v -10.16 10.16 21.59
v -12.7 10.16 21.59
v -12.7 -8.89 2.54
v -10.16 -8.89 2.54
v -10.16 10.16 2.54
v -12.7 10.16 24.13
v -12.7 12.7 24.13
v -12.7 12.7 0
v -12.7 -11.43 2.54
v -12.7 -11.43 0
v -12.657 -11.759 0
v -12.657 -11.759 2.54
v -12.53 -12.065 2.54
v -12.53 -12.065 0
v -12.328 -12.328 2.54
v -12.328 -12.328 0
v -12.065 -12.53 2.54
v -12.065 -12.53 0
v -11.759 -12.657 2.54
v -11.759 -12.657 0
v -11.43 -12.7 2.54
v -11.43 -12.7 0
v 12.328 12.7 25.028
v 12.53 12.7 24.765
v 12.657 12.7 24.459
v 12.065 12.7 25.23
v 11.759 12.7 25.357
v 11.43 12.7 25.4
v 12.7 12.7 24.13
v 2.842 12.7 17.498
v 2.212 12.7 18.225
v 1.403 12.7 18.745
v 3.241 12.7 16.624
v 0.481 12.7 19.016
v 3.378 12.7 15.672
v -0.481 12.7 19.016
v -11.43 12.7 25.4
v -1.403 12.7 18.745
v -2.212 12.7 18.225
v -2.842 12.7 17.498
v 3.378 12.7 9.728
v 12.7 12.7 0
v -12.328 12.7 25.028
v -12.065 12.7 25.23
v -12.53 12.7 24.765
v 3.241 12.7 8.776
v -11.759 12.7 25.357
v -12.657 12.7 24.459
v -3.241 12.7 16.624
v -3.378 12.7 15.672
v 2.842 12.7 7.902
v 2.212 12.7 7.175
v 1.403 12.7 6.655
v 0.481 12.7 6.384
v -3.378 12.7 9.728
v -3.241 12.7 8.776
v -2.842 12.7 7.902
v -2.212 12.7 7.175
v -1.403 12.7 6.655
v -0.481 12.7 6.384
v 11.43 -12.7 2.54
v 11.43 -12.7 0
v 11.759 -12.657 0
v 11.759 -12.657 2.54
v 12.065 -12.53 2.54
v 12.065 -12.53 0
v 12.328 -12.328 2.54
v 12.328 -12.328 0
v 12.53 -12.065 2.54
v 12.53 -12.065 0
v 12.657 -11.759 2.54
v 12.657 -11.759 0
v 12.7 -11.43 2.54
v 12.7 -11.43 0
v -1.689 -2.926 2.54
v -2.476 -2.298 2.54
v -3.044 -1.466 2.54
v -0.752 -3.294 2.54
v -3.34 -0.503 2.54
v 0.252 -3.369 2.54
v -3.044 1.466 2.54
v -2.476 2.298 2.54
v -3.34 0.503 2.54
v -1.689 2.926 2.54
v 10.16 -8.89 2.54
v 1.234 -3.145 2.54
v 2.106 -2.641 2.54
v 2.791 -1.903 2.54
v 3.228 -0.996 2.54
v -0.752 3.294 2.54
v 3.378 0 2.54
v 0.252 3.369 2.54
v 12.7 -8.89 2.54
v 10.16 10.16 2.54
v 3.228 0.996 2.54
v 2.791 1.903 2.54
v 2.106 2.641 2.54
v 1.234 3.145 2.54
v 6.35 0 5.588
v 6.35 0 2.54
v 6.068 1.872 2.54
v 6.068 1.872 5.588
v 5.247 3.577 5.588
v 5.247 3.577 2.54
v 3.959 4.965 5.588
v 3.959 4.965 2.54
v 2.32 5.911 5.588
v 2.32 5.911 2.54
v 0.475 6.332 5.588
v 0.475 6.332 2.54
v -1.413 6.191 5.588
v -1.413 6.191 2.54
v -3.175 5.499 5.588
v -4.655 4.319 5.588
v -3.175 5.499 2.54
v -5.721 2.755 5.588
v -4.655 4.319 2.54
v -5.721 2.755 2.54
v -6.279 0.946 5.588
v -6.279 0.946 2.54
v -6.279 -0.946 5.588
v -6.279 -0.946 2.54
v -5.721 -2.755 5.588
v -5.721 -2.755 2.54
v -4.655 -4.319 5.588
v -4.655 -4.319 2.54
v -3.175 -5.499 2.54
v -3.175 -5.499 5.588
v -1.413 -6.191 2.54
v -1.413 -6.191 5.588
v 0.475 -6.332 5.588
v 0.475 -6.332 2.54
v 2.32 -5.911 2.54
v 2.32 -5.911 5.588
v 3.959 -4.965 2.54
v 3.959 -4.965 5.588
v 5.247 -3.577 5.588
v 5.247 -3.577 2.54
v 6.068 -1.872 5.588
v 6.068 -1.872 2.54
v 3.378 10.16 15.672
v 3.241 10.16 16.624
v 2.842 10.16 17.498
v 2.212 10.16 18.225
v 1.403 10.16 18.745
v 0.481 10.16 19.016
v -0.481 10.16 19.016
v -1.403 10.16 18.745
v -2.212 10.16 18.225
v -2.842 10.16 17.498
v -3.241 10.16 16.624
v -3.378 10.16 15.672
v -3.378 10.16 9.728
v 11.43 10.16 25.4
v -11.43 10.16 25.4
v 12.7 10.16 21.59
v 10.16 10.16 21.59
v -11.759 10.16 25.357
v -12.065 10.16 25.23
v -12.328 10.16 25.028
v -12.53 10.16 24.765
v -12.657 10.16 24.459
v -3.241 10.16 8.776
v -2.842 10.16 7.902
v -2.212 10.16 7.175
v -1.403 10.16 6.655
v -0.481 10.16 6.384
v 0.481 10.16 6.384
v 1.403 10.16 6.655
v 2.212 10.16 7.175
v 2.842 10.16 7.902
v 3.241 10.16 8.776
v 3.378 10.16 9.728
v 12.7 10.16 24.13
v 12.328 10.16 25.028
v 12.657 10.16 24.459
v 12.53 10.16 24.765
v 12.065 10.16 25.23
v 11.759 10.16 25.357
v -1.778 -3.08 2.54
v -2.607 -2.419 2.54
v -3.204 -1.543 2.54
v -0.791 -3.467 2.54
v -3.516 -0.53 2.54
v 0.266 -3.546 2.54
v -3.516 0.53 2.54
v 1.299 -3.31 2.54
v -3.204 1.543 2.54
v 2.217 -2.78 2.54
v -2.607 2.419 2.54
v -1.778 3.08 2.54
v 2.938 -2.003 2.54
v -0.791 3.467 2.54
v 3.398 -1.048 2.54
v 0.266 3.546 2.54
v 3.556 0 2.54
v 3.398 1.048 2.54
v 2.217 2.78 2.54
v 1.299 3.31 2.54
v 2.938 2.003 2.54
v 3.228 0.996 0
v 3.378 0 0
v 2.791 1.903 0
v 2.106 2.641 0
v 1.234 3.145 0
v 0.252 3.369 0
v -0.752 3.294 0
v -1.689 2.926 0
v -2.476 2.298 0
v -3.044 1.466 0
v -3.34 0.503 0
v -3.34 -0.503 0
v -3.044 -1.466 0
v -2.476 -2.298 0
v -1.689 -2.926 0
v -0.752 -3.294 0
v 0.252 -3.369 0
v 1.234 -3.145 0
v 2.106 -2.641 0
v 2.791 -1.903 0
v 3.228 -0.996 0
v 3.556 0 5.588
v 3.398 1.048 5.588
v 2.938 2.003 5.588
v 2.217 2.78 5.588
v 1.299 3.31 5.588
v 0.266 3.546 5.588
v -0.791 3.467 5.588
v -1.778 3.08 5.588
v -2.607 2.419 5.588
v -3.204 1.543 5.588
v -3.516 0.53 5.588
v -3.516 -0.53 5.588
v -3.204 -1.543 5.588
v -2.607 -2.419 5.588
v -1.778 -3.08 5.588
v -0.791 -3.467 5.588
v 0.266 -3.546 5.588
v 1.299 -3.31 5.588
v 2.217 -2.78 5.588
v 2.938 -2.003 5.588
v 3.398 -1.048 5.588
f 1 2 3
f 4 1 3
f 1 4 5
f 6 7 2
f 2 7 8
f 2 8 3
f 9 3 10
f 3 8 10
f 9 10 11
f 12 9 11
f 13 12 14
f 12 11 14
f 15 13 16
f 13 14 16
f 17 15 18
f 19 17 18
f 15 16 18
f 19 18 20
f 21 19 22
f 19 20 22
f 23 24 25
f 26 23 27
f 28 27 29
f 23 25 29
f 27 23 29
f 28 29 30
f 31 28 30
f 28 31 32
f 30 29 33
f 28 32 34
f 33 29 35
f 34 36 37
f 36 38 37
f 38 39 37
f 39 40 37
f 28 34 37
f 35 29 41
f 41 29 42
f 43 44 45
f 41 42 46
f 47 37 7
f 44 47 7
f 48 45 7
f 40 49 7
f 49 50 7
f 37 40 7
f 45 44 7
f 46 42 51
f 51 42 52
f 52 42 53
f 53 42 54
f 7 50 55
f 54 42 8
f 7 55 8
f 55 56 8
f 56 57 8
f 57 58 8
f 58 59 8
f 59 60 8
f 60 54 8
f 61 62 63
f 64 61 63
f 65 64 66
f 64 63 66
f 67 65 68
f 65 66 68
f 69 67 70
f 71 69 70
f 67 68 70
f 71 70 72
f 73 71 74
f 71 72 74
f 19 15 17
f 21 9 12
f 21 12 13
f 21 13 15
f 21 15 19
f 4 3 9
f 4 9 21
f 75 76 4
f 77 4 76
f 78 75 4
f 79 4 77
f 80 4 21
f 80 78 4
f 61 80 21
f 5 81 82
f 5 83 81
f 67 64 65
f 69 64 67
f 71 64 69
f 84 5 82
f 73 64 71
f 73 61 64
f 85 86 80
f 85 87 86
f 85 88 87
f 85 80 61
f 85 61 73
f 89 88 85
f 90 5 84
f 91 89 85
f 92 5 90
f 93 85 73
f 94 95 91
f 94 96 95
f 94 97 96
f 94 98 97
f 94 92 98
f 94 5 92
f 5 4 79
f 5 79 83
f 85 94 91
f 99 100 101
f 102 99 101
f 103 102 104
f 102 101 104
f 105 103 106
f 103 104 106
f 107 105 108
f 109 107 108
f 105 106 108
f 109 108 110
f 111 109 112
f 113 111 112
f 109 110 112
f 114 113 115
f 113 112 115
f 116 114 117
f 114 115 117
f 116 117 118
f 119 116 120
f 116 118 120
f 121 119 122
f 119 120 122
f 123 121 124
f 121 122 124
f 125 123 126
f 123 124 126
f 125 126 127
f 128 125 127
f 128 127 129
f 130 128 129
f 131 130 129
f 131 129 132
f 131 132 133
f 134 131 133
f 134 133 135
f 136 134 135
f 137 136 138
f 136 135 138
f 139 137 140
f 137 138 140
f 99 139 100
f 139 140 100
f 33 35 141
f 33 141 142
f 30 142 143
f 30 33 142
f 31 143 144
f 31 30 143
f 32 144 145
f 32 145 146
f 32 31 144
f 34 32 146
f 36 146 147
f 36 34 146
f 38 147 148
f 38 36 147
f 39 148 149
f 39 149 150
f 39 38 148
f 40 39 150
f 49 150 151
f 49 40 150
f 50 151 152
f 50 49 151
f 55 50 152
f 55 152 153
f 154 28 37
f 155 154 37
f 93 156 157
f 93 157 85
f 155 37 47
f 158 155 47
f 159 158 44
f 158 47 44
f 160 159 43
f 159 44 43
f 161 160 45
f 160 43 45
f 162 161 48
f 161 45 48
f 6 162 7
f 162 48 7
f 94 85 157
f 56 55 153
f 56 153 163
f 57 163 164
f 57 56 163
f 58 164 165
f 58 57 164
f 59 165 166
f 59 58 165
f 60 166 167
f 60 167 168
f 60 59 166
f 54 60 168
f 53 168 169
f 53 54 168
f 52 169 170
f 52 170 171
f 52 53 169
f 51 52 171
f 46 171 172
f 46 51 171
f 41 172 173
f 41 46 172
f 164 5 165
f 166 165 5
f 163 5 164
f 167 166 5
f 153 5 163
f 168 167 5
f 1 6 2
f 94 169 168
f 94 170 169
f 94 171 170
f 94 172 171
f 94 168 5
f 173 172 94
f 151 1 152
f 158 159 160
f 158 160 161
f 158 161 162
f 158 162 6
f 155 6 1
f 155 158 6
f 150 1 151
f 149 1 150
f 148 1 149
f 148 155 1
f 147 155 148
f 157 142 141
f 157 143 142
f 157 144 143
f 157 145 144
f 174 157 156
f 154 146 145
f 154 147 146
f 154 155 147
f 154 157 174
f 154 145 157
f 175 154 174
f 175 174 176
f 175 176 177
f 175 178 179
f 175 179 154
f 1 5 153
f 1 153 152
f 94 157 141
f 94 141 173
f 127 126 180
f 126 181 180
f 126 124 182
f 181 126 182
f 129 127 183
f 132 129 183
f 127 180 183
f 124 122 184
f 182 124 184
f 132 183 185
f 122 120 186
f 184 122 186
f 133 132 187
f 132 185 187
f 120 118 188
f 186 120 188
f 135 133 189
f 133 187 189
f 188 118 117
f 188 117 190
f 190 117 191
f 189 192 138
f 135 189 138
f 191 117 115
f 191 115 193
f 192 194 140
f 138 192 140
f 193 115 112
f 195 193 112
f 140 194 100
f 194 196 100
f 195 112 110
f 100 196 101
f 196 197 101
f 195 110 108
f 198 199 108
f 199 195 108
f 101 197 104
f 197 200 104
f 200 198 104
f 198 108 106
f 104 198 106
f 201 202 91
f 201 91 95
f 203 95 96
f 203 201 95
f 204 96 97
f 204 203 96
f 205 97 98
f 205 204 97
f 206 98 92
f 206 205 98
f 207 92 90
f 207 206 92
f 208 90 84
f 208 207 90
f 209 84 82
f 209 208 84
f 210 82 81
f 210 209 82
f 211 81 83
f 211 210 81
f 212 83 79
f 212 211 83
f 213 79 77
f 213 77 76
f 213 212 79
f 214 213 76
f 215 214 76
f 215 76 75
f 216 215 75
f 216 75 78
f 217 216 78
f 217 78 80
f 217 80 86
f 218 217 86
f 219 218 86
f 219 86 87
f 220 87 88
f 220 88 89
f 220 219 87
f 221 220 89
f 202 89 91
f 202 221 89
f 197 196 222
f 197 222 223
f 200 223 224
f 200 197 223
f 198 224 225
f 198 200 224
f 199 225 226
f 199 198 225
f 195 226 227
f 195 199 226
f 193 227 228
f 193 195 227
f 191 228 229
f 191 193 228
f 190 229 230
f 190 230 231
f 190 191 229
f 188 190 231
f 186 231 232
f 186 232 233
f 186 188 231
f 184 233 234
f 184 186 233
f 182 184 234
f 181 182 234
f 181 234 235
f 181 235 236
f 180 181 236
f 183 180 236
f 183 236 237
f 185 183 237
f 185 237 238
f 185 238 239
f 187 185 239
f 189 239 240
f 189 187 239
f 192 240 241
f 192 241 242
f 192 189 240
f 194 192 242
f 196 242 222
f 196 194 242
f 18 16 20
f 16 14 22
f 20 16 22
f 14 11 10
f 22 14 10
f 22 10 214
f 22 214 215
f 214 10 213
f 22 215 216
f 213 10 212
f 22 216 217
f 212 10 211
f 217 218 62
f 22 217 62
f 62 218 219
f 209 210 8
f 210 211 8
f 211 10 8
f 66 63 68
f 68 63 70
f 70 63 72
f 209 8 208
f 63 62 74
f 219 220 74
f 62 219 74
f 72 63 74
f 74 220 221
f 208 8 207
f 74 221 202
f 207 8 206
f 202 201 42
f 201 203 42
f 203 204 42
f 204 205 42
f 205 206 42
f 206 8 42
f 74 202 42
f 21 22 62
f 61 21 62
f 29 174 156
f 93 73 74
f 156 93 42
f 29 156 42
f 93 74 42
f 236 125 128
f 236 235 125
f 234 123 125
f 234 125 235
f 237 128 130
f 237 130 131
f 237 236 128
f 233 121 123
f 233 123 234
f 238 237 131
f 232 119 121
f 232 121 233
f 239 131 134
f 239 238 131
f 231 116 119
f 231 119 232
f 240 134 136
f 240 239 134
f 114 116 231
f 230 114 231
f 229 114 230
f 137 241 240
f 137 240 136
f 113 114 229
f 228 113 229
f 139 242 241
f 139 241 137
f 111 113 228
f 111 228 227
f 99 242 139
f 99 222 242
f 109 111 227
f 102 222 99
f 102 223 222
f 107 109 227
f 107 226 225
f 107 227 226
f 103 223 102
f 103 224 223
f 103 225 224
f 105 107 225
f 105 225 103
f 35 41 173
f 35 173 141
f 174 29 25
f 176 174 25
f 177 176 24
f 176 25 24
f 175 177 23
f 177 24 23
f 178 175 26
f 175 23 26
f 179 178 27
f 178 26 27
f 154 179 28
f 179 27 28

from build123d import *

# Parameters (mm, degrees)
SKETCH_R      = 3.3782
PAD_DEPTH     = 2.54
PAD001_DEPTH  = 2.54
PAD002_DEPTH  = 2.54
SKETCH003_R   = 6.35
SKETCH003_R_2 = 3.556
PAD003_DEPTH  = 3.048


with BuildPart() as bracket:
    # Sketch → Pad (new body)
    with BuildSketch(Plane.XY):
        with BuildLine():
            Line((-12.7, 12.7), (-12.7, -11.43))
            ThreePointArc((-12.7, -11.43), (-12.328026, -12.328026), (-11.43, -12.7))
            Line((-11.43, -12.7), (11.43, -12.7))
            ThreePointArc((11.43, -12.7), (12.328026, -12.328026), (12.7, -11.43))
            Line((12.7, -11.43), (12.7, 12.7))
            Line((12.7, 12.7), (-12.7, 12.7))
        make_face()
        Circle(SKETCH_R, mode=Mode.SUBTRACT)
    extrude(amount=PAD_DEPTH)

    # Sketch001 → Pad001 (join)
    with BuildSketch(Plane.XZ.offset(-12.7)):
        with BuildLine():
            Line((-12.7, 0), (12.7, 0))
            Line((12.7, 0), (12.7, 24.13))
            ThreePointArc((12.7, 24.13), (12.328026, 25.028026), (11.43, 25.4))
            Line((11.43, 25.4), (-11.43, 25.4))
            ThreePointArc((-11.43, 25.4), (-12.328026, 25.028026), (-12.7, 24.13))
            Line((-12.7, 24.13), (-12.7, 0))
        make_face()
        with BuildLine():
            Line((-3.3782, 15.6718), (-3.3782, 9.7282))
            ThreePointArc((-3.3782, 9.7282), (0, 6.35), (3.3782, 9.7282))
            Line((3.3782, 9.7282), (3.3782, 15.6718))
            ThreePointArc((3.3782, 15.6718), (0, 19.05), (-3.3782, 15.6718))
        make_face(mode=Mode.SUBTRACT)
    extrude(amount=PAD001_DEPTH)

    # Sketch002 → Pad002 (join)
    with BuildSketch(Plane.YZ.offset(12.7)):
        Polygon((12.7, 0), (12.7, 24.13), (-11.43, 0), align=None)
    pad002 = extrude(amount=-PAD002_DEPTH)

    # Mirrored: Pad002 across YZ
    add(pad002.mirror(Plane.YZ))


with BuildPart() as spacer:
    # Sketch003 → Pad003 (new body)
    with BuildSketch(Plane.XY.offset(2.54)):
        Circle(SKETCH003_R)
        Circle(SKETCH003_R_2, mode=Mode.SUBTRACT)
    extrude(amount=PAD003_DEPTH)


solid = Compound([bracket.part, spacer.part])
